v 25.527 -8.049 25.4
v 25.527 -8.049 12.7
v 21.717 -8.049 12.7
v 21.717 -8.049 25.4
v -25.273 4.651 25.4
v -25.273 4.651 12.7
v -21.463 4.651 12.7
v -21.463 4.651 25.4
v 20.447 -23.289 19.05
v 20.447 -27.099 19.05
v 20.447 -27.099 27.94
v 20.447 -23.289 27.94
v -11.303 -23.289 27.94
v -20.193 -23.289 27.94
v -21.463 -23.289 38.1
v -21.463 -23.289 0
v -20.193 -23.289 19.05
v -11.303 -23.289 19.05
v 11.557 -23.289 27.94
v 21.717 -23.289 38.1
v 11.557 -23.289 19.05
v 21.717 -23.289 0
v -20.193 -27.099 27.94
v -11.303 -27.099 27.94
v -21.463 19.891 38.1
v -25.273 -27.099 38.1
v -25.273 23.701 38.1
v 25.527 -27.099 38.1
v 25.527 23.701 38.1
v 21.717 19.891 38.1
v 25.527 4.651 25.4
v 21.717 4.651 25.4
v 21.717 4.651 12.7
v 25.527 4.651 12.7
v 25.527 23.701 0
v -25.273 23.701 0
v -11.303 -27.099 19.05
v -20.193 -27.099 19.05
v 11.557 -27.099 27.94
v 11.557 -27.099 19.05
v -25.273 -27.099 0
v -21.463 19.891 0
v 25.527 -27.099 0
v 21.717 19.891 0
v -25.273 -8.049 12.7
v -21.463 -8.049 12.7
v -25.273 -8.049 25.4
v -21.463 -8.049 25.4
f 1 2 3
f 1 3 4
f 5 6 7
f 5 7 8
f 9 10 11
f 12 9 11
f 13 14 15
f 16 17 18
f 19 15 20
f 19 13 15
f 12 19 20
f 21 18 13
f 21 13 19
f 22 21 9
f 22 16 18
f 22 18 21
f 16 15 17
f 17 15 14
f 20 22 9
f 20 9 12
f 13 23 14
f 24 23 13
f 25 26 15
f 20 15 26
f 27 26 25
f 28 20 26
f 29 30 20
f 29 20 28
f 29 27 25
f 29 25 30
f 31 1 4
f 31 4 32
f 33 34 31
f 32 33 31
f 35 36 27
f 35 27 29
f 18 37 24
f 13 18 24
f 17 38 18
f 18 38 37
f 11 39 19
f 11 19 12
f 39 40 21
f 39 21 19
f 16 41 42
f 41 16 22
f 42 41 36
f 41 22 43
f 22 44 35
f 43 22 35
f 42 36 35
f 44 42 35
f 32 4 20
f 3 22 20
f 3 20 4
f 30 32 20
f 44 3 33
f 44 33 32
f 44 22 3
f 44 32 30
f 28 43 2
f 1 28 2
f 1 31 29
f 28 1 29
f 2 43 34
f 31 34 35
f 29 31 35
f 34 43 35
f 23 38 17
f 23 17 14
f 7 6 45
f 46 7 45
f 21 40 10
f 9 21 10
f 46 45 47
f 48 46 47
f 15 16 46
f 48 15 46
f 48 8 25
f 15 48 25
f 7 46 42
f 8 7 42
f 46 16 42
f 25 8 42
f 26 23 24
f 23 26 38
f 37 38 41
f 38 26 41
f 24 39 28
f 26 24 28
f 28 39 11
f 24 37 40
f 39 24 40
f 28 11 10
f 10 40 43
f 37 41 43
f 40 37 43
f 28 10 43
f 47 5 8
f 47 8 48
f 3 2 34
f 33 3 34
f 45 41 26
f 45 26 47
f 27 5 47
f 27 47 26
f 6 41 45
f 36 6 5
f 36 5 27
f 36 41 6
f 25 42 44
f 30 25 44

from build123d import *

# Parameters (mm, degrees)
F0_W      = 50.8
F0_H      = 50.8
F1_DEPTH  = 38.1
F2_T      = -3.81
F10_W     = 12.7
F10_H     = 12.7
F11_DEPTH = 25.4
F12_W     = 12.7
F12_H     = 12.7
F13_DEPTH = 25.4
F14_W     = 8.89
F14_H     = 8.89
F15_DEPTH = 25.4


# Not quite as in the source:
# - the program builds the solid bodies; features that only make, move or delete a surface that nothing else refers to are left out


with BuildPart() as f1:
    # F0 (on Top) → F1 (new body)
    with BuildSketch(Plane.XY):
        with Locations((0.1272018999, -1.6994403997)):
            Rectangle(F0_W, F0_H)
    extrude(amount=F1_DEPTH)

    # F2
    f2_openings = [f1.faces().sort_by_distance(p)[0] for p in [
        (0.127202, -1.69944, 38.1),
        (0.127202, -1.69944, 0),
    ]]
    offset(amount=F2_T, openings=f2_openings)

    # F10 (on face) → F11 (cut)
    with BuildSketch(Plane.YZ.offset(25.5272018999)):
        with Locations((-1.6994403997, 19.05)):
            Rectangle(F10_W, F10_H)
    extrude(amount=-F11_DEPTH, mode=Mode.SUBTRACT)

    # F12 (on face) → F13 (cut)
    with BuildSketch(Plane(origin=(-25.2727981001, 0, 0), x_dir=(0, -1, 0), z_dir=(-1, 0, 0))):
        with Locations((1.6994403997, 19.05)):
            Rectangle(F12_W, F12_H)
    extrude(amount=-F13_DEPTH, mode=Mode.SUBTRACT)

    # F14 (on face) → F15 (cut)
    with BuildSketch(Plane.XZ.offset(27.0994403997)):
        with Locations((16.0022018999, 23.495)):
            Rectangle(F14_W, F14_H)
        with Locations((-15.7477981001, 23.495)):
            Rectangle(F14_W, F14_H)
    extrude(amount=-F15_DEPTH, mode=Mode.SUBTRACT)


solid = f1.part
